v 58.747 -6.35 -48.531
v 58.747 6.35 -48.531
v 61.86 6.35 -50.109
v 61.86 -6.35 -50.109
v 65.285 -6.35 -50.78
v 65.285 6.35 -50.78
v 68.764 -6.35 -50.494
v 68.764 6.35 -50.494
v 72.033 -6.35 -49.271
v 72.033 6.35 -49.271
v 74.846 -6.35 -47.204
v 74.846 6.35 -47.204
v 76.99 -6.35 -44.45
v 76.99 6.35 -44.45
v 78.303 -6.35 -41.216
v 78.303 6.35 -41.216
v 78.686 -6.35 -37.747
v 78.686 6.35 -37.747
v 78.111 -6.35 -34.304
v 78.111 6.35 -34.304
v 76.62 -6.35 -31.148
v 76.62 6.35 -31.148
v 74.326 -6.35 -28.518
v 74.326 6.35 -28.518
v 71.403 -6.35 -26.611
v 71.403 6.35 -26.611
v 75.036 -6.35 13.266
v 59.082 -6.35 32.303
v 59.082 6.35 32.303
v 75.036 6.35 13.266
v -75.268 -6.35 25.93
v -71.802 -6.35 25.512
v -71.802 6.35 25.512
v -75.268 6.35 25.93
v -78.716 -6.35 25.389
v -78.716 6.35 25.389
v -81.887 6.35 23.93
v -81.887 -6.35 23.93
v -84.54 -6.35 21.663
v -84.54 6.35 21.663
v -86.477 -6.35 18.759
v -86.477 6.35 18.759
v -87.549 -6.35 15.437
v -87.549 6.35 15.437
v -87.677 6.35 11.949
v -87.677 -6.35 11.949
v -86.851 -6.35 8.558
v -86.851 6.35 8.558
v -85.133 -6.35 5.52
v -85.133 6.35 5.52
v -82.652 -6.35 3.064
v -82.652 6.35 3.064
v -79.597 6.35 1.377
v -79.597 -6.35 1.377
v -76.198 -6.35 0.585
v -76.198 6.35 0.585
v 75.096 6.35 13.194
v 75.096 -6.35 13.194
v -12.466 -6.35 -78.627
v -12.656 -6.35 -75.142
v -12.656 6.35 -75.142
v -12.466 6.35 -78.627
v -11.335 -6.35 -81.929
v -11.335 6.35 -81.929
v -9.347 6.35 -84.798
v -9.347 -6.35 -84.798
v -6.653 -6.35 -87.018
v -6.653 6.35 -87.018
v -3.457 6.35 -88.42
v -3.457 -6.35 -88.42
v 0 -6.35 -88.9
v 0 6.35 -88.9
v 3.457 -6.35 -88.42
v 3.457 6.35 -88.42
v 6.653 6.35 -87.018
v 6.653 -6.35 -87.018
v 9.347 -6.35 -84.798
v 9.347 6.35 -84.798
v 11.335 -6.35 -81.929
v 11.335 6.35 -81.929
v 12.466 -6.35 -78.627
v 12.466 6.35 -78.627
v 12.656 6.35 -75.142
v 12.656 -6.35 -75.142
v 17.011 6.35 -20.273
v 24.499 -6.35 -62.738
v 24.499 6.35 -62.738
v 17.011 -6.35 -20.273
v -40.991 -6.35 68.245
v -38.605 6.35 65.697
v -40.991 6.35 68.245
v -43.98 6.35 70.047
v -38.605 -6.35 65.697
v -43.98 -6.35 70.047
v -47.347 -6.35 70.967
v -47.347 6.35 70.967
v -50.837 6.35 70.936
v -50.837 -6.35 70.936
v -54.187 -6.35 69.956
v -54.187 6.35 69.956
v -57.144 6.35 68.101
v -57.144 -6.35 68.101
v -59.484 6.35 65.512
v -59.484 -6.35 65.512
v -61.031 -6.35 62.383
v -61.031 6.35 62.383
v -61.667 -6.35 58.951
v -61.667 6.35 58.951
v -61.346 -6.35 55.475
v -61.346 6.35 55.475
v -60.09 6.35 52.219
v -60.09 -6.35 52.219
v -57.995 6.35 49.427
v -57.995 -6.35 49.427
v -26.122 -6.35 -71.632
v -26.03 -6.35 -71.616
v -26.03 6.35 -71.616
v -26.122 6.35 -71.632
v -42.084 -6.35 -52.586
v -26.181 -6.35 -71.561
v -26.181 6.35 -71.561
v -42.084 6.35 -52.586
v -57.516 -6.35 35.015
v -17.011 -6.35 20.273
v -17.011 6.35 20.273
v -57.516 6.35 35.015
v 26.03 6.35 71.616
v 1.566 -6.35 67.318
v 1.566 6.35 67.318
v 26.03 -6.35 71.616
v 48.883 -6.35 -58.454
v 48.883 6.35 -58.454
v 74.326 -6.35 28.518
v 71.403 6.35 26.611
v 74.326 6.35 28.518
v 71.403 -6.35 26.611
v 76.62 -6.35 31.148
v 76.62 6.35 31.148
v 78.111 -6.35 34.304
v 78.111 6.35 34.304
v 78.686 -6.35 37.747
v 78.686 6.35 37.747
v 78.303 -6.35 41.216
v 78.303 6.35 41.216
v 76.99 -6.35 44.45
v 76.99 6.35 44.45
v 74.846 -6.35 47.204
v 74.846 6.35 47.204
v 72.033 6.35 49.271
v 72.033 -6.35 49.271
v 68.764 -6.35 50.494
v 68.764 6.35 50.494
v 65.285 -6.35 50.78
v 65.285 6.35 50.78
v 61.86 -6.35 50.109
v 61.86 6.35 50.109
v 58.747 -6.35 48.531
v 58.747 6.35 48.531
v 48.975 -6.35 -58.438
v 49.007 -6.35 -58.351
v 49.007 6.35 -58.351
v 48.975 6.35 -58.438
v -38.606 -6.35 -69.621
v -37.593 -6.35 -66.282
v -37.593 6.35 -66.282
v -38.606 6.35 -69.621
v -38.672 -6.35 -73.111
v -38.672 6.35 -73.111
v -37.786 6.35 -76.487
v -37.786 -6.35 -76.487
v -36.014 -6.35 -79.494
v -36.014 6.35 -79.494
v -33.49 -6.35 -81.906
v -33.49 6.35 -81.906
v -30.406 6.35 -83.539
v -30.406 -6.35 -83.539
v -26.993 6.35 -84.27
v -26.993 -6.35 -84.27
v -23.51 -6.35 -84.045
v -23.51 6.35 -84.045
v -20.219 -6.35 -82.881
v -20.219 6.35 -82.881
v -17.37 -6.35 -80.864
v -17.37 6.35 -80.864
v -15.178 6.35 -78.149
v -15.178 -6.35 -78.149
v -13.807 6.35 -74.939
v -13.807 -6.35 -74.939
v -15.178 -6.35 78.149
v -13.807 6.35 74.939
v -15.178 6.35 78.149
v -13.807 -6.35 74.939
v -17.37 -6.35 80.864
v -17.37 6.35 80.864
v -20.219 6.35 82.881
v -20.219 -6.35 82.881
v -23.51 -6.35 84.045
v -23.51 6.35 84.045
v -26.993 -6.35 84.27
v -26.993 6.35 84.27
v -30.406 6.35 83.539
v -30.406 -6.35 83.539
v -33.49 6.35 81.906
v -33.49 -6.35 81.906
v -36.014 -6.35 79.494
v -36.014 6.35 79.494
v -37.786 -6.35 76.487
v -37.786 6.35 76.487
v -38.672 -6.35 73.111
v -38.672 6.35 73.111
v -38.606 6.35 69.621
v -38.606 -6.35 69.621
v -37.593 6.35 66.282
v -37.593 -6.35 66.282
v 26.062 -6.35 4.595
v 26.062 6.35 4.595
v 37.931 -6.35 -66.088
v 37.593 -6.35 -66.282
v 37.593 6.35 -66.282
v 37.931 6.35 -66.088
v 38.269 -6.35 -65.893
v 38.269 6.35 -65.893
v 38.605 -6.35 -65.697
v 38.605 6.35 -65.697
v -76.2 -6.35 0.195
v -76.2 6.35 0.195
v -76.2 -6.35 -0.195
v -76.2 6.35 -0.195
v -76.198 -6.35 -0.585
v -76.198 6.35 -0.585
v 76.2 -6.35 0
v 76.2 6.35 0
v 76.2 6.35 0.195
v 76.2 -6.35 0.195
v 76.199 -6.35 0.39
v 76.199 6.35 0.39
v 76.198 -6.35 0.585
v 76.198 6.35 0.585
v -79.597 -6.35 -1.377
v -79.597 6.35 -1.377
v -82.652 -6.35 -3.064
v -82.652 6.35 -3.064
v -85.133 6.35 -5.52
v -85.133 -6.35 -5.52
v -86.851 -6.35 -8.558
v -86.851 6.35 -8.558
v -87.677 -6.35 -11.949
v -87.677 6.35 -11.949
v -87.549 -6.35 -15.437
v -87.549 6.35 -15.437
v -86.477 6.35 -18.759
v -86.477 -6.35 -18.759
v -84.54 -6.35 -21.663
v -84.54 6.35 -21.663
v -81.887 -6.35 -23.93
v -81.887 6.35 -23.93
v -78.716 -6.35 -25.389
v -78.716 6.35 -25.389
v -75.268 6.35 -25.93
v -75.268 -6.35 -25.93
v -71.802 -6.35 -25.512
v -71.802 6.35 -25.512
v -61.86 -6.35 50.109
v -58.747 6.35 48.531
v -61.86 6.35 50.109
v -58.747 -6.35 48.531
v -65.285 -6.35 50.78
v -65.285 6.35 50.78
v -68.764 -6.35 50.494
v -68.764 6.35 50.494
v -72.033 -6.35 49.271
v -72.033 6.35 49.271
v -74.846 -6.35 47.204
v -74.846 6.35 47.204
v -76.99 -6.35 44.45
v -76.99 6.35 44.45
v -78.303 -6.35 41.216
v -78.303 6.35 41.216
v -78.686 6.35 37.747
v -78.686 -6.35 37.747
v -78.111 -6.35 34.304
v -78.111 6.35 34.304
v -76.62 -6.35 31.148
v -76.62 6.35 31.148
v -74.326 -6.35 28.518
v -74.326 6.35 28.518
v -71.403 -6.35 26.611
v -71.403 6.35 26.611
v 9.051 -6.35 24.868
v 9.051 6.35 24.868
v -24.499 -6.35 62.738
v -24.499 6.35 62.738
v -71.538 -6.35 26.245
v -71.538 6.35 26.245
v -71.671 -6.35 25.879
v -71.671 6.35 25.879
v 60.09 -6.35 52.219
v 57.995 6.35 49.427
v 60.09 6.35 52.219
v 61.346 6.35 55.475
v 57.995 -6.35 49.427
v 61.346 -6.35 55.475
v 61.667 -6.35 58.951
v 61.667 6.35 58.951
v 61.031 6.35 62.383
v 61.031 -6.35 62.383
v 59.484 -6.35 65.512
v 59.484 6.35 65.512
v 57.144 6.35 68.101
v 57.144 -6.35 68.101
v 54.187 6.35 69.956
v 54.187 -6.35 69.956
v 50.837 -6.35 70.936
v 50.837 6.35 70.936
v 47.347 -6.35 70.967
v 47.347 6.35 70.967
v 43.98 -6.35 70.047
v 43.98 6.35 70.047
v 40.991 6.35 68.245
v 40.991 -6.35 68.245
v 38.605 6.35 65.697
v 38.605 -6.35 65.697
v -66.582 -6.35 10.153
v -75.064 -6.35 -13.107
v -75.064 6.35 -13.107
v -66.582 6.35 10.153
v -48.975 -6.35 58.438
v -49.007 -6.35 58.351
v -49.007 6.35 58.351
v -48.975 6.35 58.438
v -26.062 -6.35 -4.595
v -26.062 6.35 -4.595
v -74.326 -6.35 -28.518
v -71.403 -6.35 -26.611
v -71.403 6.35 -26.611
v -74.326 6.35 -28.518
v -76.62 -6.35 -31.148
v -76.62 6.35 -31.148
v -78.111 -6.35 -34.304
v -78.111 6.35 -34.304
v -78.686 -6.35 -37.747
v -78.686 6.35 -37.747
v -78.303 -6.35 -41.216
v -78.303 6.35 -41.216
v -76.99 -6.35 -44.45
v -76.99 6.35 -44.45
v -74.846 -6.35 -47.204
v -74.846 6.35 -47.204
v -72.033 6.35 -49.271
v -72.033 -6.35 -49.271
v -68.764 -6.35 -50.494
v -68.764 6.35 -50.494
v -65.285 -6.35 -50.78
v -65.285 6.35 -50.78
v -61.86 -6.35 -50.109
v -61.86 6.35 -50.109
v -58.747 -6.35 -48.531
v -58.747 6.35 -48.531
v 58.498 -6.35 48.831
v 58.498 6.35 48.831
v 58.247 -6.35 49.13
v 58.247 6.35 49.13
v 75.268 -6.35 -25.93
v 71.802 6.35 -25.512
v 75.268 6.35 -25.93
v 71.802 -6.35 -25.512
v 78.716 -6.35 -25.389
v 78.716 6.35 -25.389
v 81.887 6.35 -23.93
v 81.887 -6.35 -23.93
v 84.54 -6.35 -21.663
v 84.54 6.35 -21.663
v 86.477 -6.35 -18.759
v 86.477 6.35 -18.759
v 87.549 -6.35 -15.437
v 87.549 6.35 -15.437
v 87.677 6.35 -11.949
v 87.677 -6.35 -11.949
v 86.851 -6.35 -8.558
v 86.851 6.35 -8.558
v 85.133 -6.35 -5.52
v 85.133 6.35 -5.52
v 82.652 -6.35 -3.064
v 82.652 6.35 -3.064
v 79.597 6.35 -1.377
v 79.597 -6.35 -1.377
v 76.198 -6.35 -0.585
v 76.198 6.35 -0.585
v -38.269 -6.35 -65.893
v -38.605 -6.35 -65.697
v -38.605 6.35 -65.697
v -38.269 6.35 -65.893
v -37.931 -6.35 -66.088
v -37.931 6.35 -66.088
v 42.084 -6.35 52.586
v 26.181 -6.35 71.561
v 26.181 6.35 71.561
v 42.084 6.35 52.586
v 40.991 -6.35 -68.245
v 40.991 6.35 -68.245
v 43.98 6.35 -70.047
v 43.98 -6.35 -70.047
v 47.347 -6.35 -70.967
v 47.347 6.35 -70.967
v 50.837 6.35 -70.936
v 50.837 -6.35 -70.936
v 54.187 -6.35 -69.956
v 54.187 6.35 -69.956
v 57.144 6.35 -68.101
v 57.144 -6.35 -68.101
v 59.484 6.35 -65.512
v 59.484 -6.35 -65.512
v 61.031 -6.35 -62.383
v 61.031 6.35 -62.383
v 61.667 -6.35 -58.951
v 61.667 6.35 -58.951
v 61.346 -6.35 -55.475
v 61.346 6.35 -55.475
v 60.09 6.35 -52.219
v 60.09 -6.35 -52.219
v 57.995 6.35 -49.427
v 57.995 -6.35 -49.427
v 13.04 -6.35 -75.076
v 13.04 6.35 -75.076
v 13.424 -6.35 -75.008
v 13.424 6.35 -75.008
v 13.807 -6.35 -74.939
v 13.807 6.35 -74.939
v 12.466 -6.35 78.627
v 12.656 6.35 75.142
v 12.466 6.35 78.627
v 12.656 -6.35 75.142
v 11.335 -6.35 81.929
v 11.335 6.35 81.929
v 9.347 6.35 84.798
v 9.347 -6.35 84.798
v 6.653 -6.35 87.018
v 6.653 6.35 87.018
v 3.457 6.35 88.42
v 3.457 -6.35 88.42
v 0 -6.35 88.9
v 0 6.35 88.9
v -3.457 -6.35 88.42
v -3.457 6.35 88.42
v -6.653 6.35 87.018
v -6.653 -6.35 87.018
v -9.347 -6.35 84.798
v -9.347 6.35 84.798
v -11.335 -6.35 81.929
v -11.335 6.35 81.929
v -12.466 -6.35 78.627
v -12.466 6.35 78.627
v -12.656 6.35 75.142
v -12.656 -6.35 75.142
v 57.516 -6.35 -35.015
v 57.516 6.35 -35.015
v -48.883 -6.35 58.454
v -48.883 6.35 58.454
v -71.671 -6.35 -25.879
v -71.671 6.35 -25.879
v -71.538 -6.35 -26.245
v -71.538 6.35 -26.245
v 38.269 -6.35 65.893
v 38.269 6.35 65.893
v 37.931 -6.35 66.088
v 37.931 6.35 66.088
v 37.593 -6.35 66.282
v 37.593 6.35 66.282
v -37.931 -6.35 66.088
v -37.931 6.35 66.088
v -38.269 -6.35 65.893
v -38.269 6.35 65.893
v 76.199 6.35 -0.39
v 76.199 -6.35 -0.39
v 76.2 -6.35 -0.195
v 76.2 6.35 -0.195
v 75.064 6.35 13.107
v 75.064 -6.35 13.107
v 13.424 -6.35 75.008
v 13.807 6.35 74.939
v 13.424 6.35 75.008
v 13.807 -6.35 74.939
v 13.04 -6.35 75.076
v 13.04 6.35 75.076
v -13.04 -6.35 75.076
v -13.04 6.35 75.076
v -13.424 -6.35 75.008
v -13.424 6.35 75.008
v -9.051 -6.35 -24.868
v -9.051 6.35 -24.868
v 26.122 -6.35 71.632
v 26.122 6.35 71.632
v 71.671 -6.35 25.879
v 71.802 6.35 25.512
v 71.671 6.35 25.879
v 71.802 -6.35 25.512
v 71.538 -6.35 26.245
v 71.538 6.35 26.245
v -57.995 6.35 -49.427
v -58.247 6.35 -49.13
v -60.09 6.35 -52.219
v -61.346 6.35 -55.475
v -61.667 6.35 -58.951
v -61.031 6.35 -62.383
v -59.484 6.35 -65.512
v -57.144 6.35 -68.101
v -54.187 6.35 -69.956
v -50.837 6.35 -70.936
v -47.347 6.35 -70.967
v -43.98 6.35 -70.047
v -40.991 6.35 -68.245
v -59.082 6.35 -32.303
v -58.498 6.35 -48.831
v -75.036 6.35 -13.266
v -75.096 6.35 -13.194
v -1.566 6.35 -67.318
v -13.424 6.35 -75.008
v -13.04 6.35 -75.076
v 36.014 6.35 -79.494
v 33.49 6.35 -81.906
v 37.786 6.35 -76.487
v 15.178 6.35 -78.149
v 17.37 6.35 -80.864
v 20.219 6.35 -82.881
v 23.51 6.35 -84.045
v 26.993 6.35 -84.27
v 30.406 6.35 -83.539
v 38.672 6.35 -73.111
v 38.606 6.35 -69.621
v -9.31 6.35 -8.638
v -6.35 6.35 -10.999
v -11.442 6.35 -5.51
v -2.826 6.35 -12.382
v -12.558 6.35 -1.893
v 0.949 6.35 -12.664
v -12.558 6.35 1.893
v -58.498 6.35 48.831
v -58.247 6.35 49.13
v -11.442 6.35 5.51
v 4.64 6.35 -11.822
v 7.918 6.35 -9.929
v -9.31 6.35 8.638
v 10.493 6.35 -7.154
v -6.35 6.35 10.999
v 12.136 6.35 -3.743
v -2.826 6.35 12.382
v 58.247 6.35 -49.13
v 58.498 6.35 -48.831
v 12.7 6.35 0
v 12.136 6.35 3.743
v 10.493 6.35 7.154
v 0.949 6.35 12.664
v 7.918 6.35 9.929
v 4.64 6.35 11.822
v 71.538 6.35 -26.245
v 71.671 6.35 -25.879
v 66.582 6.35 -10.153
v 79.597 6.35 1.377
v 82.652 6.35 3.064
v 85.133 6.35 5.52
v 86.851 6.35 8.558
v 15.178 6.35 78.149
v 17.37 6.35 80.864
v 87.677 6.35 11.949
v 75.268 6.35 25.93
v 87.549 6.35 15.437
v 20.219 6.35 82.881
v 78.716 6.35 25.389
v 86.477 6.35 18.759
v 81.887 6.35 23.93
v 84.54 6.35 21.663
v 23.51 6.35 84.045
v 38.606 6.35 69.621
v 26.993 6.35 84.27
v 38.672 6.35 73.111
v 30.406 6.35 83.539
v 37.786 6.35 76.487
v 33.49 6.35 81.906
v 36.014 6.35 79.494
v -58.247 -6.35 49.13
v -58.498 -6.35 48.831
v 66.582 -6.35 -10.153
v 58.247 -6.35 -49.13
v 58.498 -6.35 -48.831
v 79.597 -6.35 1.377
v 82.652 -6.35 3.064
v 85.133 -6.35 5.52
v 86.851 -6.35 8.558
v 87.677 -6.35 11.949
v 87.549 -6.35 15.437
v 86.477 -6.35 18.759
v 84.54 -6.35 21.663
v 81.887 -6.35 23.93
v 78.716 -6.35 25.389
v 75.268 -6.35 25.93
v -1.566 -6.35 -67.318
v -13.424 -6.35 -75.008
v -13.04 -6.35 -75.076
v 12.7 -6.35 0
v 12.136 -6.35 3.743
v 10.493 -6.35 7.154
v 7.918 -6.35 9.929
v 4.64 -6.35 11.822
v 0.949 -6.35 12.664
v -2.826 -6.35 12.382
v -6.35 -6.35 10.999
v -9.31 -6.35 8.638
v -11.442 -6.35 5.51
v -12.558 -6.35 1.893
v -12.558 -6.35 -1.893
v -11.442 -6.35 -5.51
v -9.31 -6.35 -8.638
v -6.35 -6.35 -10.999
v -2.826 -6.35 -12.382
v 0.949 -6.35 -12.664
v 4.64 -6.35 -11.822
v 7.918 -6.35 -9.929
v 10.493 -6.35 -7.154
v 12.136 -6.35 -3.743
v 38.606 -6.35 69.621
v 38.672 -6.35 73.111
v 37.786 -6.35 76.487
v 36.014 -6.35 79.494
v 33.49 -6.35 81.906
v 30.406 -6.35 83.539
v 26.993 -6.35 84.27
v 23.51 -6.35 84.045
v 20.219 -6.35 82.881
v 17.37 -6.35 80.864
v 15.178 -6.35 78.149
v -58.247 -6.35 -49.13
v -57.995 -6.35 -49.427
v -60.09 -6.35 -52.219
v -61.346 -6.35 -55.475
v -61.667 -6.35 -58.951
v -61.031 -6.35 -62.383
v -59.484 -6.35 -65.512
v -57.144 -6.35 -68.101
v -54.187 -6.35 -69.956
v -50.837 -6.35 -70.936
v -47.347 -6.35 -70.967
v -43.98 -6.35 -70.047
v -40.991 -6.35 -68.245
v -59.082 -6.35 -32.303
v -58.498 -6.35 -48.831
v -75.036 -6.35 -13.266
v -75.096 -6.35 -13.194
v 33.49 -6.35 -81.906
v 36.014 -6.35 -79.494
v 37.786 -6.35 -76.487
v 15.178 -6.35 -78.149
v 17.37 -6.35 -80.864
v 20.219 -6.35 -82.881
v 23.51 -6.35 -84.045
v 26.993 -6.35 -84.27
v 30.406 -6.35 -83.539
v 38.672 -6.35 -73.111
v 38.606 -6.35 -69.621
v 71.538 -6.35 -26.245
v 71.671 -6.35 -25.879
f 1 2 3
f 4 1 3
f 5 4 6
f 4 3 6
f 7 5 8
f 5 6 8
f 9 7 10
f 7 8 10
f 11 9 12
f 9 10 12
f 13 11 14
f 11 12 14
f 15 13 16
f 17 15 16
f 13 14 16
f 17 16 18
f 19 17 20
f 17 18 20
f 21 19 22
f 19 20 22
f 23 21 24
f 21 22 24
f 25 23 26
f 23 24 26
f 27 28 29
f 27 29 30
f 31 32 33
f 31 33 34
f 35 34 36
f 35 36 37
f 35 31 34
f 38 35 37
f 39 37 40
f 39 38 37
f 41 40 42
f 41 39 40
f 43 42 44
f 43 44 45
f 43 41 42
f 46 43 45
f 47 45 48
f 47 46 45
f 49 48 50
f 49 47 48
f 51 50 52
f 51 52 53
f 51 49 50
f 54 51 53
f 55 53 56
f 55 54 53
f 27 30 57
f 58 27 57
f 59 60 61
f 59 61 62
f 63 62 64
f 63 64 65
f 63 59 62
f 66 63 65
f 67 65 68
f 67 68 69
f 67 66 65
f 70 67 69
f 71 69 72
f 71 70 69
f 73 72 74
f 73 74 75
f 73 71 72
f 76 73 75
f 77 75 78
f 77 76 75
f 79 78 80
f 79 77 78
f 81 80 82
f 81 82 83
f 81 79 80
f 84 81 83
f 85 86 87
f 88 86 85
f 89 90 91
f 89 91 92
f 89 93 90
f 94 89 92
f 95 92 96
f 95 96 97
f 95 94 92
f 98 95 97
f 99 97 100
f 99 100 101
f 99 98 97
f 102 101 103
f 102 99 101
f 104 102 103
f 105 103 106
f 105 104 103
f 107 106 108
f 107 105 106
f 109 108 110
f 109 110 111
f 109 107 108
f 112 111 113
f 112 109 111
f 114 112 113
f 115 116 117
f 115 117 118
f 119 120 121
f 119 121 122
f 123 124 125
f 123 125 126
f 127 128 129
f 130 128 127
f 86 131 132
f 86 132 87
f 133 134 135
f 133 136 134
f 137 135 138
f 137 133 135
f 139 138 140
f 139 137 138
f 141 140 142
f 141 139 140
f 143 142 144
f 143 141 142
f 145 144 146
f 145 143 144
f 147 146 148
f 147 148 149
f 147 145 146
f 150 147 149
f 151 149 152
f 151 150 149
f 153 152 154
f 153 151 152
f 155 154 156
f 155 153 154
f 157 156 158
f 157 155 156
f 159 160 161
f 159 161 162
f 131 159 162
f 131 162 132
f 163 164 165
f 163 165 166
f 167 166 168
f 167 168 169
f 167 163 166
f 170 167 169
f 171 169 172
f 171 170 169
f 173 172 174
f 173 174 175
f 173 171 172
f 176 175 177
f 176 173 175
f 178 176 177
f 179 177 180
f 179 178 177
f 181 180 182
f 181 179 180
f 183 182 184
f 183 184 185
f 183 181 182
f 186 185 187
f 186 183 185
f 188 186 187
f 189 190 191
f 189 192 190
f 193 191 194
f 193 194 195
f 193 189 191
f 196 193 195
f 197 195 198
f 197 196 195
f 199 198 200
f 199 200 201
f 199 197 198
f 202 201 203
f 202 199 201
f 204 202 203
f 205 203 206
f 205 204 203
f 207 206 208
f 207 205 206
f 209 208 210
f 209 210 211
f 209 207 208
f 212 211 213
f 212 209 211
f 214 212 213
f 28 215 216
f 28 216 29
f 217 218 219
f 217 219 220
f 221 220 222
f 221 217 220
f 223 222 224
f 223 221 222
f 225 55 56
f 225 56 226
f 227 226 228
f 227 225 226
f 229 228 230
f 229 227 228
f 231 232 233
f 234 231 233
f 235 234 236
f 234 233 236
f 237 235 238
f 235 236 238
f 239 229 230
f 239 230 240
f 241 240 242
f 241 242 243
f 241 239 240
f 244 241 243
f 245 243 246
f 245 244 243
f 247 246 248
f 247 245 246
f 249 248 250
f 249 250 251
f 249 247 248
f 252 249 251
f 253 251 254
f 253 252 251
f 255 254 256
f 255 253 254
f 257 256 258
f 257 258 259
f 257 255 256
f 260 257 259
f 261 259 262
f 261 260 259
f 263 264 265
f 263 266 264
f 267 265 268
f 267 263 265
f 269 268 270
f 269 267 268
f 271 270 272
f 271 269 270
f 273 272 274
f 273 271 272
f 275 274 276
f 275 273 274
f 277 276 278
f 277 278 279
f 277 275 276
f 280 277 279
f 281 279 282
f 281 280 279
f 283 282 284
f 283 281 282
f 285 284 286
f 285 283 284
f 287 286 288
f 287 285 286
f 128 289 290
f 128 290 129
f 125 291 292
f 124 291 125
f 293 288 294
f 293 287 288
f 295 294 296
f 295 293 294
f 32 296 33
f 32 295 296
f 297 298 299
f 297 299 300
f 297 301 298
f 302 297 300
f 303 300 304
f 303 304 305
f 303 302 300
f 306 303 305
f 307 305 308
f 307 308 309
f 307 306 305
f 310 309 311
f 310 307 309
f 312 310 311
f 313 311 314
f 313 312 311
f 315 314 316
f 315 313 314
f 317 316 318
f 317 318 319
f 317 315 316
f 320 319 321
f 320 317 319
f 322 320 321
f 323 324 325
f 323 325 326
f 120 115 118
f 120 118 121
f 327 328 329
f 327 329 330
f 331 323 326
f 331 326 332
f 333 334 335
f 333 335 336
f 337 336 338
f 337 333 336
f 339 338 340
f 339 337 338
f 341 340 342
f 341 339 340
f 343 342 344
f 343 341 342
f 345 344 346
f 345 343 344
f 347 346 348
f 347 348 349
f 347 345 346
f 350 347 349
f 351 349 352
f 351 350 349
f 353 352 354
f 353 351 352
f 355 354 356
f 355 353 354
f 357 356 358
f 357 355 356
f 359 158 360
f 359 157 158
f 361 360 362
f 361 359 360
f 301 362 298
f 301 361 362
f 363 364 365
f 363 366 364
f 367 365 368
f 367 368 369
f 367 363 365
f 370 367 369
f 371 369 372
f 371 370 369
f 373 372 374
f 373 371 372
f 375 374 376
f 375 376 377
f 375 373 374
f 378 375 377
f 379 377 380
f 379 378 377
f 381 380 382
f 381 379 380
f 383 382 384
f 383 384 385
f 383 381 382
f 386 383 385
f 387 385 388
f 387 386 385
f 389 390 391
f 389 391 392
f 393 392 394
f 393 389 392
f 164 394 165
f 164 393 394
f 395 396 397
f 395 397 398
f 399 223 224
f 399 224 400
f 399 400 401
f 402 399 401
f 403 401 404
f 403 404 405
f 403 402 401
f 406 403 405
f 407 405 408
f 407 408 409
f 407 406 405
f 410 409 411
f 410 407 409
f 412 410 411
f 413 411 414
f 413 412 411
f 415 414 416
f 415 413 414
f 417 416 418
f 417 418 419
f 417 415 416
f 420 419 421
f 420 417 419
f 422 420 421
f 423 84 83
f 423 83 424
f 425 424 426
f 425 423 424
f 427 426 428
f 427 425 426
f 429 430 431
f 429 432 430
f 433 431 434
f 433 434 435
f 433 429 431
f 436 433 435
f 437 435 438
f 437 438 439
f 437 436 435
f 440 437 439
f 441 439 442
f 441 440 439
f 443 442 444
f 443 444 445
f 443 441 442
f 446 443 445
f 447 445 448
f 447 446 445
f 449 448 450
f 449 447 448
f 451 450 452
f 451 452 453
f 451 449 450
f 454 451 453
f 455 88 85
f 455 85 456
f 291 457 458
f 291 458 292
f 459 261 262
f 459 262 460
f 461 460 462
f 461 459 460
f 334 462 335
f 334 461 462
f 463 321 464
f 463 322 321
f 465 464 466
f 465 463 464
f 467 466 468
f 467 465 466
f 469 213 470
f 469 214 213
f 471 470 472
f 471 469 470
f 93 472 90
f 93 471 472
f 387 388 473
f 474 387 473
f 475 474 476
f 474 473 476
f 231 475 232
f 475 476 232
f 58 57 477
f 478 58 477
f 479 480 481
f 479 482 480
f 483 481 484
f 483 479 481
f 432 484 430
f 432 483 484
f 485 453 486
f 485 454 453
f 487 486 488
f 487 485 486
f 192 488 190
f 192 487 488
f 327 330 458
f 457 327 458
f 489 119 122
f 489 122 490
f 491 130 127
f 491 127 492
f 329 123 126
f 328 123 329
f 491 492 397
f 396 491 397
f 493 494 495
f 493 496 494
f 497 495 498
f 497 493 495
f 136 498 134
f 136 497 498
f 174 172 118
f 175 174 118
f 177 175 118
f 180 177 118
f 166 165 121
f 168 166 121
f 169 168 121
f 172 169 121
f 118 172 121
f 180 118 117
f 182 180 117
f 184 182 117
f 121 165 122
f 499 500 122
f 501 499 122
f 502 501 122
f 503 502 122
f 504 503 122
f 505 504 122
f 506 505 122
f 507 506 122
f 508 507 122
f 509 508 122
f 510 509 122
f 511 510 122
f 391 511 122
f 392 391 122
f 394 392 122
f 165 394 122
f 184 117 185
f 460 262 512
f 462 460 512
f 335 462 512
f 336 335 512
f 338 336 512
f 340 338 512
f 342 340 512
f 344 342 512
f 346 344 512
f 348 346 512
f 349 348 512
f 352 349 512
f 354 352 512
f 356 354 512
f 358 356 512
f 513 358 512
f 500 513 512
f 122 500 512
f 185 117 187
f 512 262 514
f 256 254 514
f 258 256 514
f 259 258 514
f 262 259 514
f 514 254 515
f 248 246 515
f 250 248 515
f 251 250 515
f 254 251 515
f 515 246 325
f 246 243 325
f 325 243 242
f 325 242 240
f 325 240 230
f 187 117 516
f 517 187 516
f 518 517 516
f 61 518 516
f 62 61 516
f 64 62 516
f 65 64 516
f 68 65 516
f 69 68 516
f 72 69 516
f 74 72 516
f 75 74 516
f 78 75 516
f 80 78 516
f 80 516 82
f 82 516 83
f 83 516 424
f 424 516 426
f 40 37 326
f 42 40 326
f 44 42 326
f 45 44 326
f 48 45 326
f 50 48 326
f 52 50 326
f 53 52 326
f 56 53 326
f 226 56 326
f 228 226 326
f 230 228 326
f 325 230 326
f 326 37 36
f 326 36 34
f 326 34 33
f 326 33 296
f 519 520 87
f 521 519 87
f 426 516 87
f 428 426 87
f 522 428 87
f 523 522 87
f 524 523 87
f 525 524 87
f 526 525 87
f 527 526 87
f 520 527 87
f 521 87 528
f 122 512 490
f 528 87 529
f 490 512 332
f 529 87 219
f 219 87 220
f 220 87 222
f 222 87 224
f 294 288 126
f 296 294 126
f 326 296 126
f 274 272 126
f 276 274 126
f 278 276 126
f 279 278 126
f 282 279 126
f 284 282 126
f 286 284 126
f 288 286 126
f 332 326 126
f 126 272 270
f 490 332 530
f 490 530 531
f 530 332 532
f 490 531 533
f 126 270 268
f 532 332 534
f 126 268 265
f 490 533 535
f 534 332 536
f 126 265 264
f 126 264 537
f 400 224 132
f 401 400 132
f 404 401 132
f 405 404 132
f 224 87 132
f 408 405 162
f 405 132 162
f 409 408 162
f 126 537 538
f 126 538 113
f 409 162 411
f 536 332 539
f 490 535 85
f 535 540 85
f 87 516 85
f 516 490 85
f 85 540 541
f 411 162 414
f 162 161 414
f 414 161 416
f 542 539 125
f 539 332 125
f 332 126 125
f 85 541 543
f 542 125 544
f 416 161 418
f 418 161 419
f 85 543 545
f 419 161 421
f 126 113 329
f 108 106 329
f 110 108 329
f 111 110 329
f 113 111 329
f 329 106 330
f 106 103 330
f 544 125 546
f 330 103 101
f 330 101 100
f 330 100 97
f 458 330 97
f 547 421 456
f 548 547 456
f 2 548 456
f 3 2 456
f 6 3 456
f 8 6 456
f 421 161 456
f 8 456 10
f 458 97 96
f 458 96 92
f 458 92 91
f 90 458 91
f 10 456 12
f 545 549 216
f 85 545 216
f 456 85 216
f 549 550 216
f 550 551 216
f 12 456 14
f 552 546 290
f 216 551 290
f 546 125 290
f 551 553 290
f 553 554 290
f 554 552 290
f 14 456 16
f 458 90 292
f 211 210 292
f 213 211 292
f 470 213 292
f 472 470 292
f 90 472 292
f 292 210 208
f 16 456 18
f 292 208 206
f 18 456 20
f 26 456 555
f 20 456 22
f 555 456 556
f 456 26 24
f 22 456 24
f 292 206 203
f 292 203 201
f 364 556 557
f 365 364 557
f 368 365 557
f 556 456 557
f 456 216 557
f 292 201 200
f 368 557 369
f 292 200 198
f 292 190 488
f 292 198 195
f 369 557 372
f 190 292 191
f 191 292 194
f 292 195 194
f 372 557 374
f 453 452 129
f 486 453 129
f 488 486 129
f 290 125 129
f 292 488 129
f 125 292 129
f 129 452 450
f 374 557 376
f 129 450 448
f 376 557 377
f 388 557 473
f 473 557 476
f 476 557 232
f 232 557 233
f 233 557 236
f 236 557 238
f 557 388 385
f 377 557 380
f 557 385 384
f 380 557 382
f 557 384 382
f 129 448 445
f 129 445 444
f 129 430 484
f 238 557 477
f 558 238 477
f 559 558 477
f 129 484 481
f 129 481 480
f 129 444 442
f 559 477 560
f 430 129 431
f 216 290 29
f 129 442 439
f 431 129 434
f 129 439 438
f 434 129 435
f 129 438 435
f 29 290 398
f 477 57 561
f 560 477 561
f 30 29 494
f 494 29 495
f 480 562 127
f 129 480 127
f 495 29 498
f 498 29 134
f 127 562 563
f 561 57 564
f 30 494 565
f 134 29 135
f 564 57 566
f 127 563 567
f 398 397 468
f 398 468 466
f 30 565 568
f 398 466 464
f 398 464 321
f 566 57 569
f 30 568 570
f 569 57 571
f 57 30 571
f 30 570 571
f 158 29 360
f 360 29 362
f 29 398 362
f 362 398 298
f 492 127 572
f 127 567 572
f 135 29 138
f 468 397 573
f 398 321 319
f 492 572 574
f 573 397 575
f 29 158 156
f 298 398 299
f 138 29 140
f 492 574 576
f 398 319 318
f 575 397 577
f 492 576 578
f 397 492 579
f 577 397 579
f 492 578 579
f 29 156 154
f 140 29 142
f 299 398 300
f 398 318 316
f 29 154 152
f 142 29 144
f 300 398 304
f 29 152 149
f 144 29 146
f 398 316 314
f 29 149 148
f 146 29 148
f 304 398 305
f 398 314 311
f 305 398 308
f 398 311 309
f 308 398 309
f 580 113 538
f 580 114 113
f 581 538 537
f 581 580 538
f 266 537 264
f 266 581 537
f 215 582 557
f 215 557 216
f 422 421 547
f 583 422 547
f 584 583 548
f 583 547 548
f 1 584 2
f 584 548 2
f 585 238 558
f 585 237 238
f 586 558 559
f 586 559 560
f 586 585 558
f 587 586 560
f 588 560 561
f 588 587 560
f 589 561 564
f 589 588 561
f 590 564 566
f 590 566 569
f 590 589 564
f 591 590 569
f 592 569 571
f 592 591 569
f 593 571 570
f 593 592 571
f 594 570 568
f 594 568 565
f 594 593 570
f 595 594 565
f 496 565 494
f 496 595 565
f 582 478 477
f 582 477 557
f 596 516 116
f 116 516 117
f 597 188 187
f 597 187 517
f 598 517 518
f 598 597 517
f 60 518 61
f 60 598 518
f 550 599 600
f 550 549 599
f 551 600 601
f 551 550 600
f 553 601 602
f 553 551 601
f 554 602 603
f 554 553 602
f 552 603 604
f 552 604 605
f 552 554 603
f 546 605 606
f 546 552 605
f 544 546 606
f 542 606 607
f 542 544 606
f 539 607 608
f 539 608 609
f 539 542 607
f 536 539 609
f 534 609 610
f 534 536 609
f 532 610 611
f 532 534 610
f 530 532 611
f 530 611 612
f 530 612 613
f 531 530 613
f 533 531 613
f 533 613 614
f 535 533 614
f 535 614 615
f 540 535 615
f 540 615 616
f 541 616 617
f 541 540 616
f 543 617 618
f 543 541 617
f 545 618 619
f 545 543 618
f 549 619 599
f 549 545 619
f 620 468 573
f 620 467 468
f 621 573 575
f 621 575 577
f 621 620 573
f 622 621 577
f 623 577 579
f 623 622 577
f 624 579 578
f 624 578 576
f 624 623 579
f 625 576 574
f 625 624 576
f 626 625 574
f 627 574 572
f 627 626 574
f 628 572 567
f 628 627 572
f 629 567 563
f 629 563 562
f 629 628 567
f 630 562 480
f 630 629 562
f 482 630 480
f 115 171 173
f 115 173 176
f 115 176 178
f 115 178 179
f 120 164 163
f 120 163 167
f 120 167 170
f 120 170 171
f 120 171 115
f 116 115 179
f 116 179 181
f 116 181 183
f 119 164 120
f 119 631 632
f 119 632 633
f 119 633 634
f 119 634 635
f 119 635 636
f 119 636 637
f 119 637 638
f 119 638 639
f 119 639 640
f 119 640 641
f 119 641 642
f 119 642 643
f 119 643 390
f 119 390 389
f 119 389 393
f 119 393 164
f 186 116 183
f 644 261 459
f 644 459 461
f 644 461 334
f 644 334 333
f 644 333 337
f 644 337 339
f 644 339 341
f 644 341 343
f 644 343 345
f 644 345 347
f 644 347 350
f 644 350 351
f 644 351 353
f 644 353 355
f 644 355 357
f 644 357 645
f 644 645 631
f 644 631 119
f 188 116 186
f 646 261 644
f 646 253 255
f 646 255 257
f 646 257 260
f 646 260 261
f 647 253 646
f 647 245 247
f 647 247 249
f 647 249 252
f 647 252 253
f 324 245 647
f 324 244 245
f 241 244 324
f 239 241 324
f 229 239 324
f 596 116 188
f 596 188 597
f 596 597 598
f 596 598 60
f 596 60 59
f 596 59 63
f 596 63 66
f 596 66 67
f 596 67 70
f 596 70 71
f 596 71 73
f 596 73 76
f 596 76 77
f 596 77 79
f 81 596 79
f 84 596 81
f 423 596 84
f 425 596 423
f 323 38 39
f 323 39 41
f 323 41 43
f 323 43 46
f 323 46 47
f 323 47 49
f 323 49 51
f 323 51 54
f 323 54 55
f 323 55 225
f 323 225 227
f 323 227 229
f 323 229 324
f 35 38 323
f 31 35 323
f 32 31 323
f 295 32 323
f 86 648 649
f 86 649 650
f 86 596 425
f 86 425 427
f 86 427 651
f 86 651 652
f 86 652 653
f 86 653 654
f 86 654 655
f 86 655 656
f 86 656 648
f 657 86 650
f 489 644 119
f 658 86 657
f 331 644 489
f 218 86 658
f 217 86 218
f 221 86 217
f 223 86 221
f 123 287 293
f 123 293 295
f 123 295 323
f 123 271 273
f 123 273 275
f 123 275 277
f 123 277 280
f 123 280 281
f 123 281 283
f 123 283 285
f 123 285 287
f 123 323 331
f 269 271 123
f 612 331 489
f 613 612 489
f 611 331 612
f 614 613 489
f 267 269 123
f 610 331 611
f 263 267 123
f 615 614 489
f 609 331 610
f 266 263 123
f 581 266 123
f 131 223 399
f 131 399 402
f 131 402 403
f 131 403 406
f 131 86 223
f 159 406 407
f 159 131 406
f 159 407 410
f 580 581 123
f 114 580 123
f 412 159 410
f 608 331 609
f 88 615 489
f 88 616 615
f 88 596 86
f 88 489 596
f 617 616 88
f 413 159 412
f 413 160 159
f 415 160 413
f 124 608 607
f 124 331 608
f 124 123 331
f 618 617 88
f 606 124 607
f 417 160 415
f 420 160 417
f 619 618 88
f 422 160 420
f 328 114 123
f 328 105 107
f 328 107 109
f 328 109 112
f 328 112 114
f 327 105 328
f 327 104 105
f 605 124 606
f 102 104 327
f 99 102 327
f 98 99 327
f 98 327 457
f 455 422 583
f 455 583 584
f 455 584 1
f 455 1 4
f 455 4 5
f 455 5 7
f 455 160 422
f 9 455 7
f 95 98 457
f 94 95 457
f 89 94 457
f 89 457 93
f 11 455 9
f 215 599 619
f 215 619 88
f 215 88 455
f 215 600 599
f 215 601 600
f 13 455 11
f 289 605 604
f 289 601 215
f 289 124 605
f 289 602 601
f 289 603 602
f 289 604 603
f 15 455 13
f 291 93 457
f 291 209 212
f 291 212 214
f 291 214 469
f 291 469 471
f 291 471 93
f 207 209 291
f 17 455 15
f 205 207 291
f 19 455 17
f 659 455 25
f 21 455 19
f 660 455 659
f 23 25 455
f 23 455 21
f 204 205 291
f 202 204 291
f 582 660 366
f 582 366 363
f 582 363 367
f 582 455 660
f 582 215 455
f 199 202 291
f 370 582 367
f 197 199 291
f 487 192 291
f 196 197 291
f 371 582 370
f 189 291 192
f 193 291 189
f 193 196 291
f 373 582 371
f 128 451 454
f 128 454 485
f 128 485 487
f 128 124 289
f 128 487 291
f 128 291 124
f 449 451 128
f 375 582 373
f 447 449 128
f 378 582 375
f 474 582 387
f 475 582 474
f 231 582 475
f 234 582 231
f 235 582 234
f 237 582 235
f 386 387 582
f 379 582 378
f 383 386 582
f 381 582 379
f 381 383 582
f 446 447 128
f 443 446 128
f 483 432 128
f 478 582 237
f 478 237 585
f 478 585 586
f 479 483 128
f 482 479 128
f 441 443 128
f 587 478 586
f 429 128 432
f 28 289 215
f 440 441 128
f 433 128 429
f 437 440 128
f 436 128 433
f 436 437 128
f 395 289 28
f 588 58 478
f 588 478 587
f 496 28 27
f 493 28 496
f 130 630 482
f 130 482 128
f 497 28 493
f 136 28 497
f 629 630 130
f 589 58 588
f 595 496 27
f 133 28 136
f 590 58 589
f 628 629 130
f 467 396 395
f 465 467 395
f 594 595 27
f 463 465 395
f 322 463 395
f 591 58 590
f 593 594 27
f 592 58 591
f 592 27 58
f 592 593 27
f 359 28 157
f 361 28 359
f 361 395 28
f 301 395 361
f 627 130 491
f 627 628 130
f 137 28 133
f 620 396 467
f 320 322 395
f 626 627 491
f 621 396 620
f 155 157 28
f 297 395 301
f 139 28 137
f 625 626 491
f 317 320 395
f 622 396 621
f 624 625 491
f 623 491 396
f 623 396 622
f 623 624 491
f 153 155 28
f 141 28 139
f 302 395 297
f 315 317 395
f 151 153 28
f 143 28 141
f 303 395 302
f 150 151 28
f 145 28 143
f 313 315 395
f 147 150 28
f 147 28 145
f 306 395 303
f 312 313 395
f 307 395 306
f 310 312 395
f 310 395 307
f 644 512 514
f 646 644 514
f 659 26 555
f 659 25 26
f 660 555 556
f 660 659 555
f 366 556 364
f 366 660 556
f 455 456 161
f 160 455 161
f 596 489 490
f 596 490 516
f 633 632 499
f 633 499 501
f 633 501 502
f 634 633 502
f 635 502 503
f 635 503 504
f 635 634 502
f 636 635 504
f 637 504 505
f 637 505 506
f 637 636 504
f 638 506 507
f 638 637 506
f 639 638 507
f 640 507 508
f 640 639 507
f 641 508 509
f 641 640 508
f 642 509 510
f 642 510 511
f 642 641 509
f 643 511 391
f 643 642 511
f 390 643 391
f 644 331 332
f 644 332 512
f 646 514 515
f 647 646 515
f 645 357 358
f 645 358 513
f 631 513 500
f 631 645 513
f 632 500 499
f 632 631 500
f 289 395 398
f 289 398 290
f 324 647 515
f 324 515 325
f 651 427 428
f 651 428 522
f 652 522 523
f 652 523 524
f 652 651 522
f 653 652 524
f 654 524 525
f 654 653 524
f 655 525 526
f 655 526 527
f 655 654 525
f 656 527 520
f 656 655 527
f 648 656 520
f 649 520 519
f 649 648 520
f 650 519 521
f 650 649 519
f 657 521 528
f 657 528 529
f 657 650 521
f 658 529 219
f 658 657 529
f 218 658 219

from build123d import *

# Parameters (mm, degrees)
F0_R     = 12.7
F1_DEPTH = 6.35


with BuildPart() as f1:
    # F0 (on Front) → F1 (new body, symmetric)
    with BuildSketch(Plane.XZ):
        with BuildLine():
            ThreePointArc((76.1977570212, -0.5846579641), (76.1994392532, -0.2923311333), (76.2, 0))
            ThreePointArc((76.2, 0), (76.1994392532, 0.2923311333), (76.1977570212, 0.5846579641))
            ThreePointArc((76.1977570212, 0.5846579641), (75.8897554045, 6.8691356552), (75.0643215302, 13.1067781397))
            Line((75.0643215302, 13.1067781397), (66.5824360485, -10.1528339917))
            Line((66.5824360485, -10.1528339917), (75.0423507795, -13.2319911382))
            ThreePointArc((75.0423507795, -13.2319911382), (75.8839990446, -6.9324374501), (76.1977570212, -0.5846579641))
        make_face()
        with BuildLine():
            ThreePointArc((75.0643215302, 13.1067781397), (75.8897554045, 6.8691356552), (76.1977570212, 0.5846579641))
            ThreePointArc((76.1977570212, 0.5846579641), (87.5494092428, 15.4373229946), (71.802434794, 25.5117690029))
            ThreePointArc((71.802434794, 25.5117690029), (73.6743133021, 19.4559903234), (75.0364186026, 13.2655901978))
            Line((75.0364186026, 13.2655901978), (75.0962151587, 13.1942390501))
            Line((75.0962151587, 13.1942390501), (75.0643215302, 13.1067781397))
        make_face()
        with BuildLine():
            ThreePointArc((71.802434794, -25.5117690029), (87.5494092428, -15.4373229946), (76.1977570212, -0.5846579641))
            ThreePointArc((76.1977570212, -0.5846579641), (75.8839990446, -6.9324374501), (75.0423507795, -13.2319911382))
            ThreePointArc((75.0423507795, -13.2319911382), (73.6786671882, -19.4394959134), (71.802434794, -25.5117690029))
        make_face()
        with BuildLine():
            ThreePointArc((75.0364186026, 13.2655901978), (73.6743133021, 19.4559903234), (71.802434794, 25.5117690029))
            ThreePointArc((71.802434794, 25.5117690029), (71.6045777039, 26.0619349214), (71.4025051926, 26.6105665521))
            ThreePointArc((71.4025051926, 26.6105665521), (68.9366006876, 32.4682165453), (65.9911357684, 38.1))
            Line((65.9911357684, 38.1), (59.08217806, 32.3026961351))
            Line((59.08217806, 32.3026961351), (75.0364186026, 13.2655901978))
        make_face()
        with BuildLine():
            ThreePointArc((71.802434794, -25.5117690029), (73.6786671882, -19.4394959134), (75.0423507795, -13.2319911382))
            Line((75.0423507795, -13.2319911382), (66.5824360485, -10.1528339917))
            Line((66.5824360485, -10.1528339917), (57.5160444937, -35.0153190433))
            Line((57.5160444937, -35.0153190433), (65.9911357684, -38.1))
            ThreePointArc((65.9911357684, -38.1), (68.9366006876, -32.4682165453), (71.4025051926, -26.6105665521))
            ThreePointArc((71.4025051926, -26.6105665521), (71.6045777039, -26.0619349214), (71.802434794, -25.5117690029))
        make_face()
        Polygon((57.5160444937, -35.0153190433), (66.5824360485, -10.1528339917), (26.0619349214, 4.5954222961), (59.08217806, 32.3026961351), (42.0838301815, 52.585664068), (9.0512150112, 24.8680088618), (1.5661335663, 67.3180151784), (-24.498605867, 62.7384980597), (-17.0107199103, 20.2725865657), (-57.5160444937, 35.0153190433), (-66.5824360485, 10.1528339917), (-26.0619349214, -4.5954222961), (-59.08217806, -32.3026961351), (-42.0838301815, -52.585664068), (-9.0512150112, -24.8680088618), (-1.5661335663, -67.3180151784), (24.498605867, -62.7384980597), (17.0107199103, -20.2725865657), align=None)
        Polygon((9.1694975967, 24.5029696394), (25.8049429742, 4.310466961), (16.6354453775, -20.1925026784), (-9.1694975967, -24.5029696394), (-25.8049429742, -4.310466961), (-16.6354453775, 20.1925026784), align=None, mode=Mode.SUBTRACT)
        with BuildLine():
            ThreePointArc((65.9911357684, 38.1), (68.9366006876, 32.4682165453), (71.4025051926, 26.6105665521))
            ThreePointArc((71.4025051926, 26.6105665521), (76.9896583964, 44.45), (58.7466792395, 48.5311001146))
            ThreePointArc((58.7466792395, 48.5311001146), (62.5866006876, 43.4667391734), (65.9911357684, 38.1))
        make_face()
        with BuildLine():
            ThreePointArc((58.7466792395, -48.5311001146), (76.9896583964, -44.45), (71.4025051926, -26.6105665521))
            ThreePointArc((71.4025051926, -26.6105665521), (68.9366006876, -32.4682165453), (65.9911357684, -38.1))
            ThreePointArc((65.9911357684, -38.1), (62.5866006876, -43.4667391734), (58.7466792395, -48.5311001146))
        make_face()
        with BuildLine():
            Line((42.0838301815, 52.585664068), (59.08217806, 32.3026961351))
            Line((59.08217806, 32.3026961351), (65.9911357684, 38.1))
            ThreePointArc((65.9911357684, 38.1), (62.5866006876, 43.4667391734), (58.7466792395, 48.5311001146))
            ThreePointArc((58.7466792395, 48.5311001146), (58.3725865657, 48.9804158581), (57.995057449, 49.4268480837))
            ThreePointArc((57.995057449, 49.4268480837), (53.6744308919, 54.0878495453), (48.9804158581, 58.3725865657))
            Line((48.9804158581, 58.3725865657), (42.0838301815, 52.585664068))
        make_face()
        with BuildLine():
            Line((65.9911357684, -38.1), (57.5160444937, -35.0153190433))
            Line((57.5160444937, -35.0153190433), (49.0065474088, -58.35064962))
            ThreePointArc((49.0065474088, -58.35064962), (53.6865385269, -54.0758317643), (57.995057449, -49.4268480837))
            ThreePointArc((57.995057449, -49.4268480837), (58.3725865657, -48.9804158581), (58.7466792395, -48.5311001146))
            ThreePointArc((58.7466792395, -48.5311001146), (62.5866006876, -43.4667391734), (65.9911357684, -38.1))
        make_face()
        with BuildLine():
            Line((26.1813579343, 71.5609984329), (42.0838301815, 52.585664068))
            Line((42.0838301815, 52.585664068), (48.9804158581, 58.3725865657))
            ThreePointArc((48.9804158581, 58.3725865657), (43.9456664643, 62.2512521883), (38.6052071601, 65.6968643097))
            ThreePointArc((38.6052071601, 65.6968643097), (38.1, 65.9911357684), (37.5925498612, 66.2815222738))
            ThreePointArc((37.5925498612, 66.2815222738), (31.9960317228, 69.1570238949), (26.1813579343, 71.5609984329))
        make_face()
        with BuildLine():
            ThreePointArc((57.995057449, -49.4268480837), (53.6865385269, -54.0758317643), (49.0065474088, -58.35064962))
            Line((49.0065474088, -58.35064962), (48.9746537804, -58.4381105304))
            Line((48.9746537804, -58.4381105304), (48.8829635959, -58.4542202932))
            ThreePointArc((48.8829635959, -58.4542202932), (43.8937236817, -62.2878882397), (38.6052071601, -65.6968643097))
            ThreePointArc((38.6052071601, -65.6968643097), (57.1438185011, -68.1013509933), (57.995057449, -49.4268480837))
        make_face()
        with BuildLine():
            ThreePointArc((48.9804158581, 58.3725865657), (53.6744308919, 54.0878495453), (57.995057449, 49.4268480837))
            ThreePointArc((57.995057449, 49.4268480837), (57.1438185011, 68.1013509933), (38.6052071601, 65.6968643097))
            ThreePointArc((38.6052071601, 65.6968643097), (43.9456664643, 62.2512521883), (48.9804158581, 58.3725865657))
        make_face()
        with BuildLine():
            Line((26.1215613783, 71.6323495805), (26.1813579343, 71.5609984329))
            ThreePointArc((26.1813579343, 71.5609984329), (31.9960317228, 69.1570238949), (37.5925498612, 66.2815222738))
            ThreePointArc((37.5925498612, 66.2815222738), (30.4055907417, 83.5386739879), (13.807377345, 74.9386170866))
            ThreePointArc((13.807377345, 74.9386170866), (19.9877747752, 73.5318220877), (26.0298711938, 71.6162398177))
            Line((26.0298711938, 71.6162398177), (26.1215613783, 71.6323495805))
        make_face()
        with BuildLine():
            ThreePointArc((38.6052071601, -65.6968643097), (43.8937236817, -62.2878882397), (48.8829635959, -58.4542202932))
            Line((48.8829635959, -58.4542202932), (24.498605867, -62.7384980597))
            Line((24.498605867, -62.7384980597), (26.0619349214, -71.6045777039))
            ThreePointArc((26.0619349214, -71.6045777039), (31.9383325803, -69.1836896384), (37.5925498612, -66.2815222738))
            ThreePointArc((37.5925498612, -66.2815222738), (38.1, -65.9911357684), (38.6052071601, -65.6968643097))
        make_face()
        with BuildLine():
            Line((26.0619349214, -71.6045777039), (24.498605867, -62.7384980597))
            Line((24.498605867, -62.7384980597), (-1.5661335663, -67.3180151784))
            Line((-1.5661335663, -67.3180151784), (0, -76.2))
            ThreePointArc((0, -76.2), (6.35, -75.9349557187), (12.6558259531, -75.1416666667))
            ThreePointArc((12.6558259531, -75.1416666667), (13.2319911382, -75.0423507795), (13.807377345, -74.9386170866))
            ThreePointArc((13.807377345, -74.9386170866), (20.0042362963, -73.5273454587), (26.0619349214, -71.6045777039))
        make_face()
        with BuildLine():
            Line((1.5661335663, 67.3180151784), (26.0298711938, 71.6162398177))
            ThreePointArc((26.0298711938, 71.6162398177), (19.9877747752, 73.5318220877), (13.807377345, 74.9386170866))
            ThreePointArc((13.807377345, 74.9386170866), (13.2319911382, 75.0423507795), (12.6558259531, 75.1416666667))
            ThreePointArc((12.6558259531, 75.1416666667), (6.35, 75.9349557187), (0, 76.2))
            Line((0, 76.2), (1.5661335663, 67.3180151784))
        make_face()
        with BuildLine():
            Line((-24.498605867, 62.7384980597), (1.5661335663, 67.3180151784))
            Line((1.5661335663, 67.3180151784), (0, 76.2))
            ThreePointArc((0, 76.2), (-6.35, 75.9349557187), (-12.6558259531, 75.1416666667))
            ThreePointArc((-12.6558259531, 75.1416666667), (-13.2319911382, 75.0423507795), (-13.807377345, 74.9386170866))
            ThreePointArc((-13.807377345, 74.9386170866), (-20.0042362963, 73.5273454587), (-26.0619349214, 71.6045777039))
            Line((-26.0619349214, 71.6045777039), (-24.498605867, 62.7384980597))
        make_face()
        with BuildLine():
            Line((0, -76.2), (-1.5661335663, -67.3180151784))
            Line((-1.5661335663, -67.3180151784), (-26.0298711938, -71.6162398177))
            ThreePointArc((-26.0298711938, -71.6162398177), (-19.9877747752, -73.5318220877), (-13.807377345, -74.9386170866))
            ThreePointArc((-13.807377345, -74.9386170866), (-13.2319911382, -75.0423507795), (-12.6558259531, -75.1416666667))
            ThreePointArc((-12.6558259531, -75.1416666667), (-6.35, -75.9349557187), (0, -76.2))
        make_face()
        with BuildLine():
            ThreePointArc((37.5925498612, -66.2815222738), (31.9383325803, -69.1836896384), (26.0619349214, -71.6045777039))
            ThreePointArc((26.0619349214, -71.6045777039), (20.0042362963, -73.5273454587), (13.807377345, -74.9386170866))
            ThreePointArc((13.807377345, -74.9386170866), (30.4055907417, -83.5386739879), (37.5925498612, -66.2815222738))
        make_face()
        with BuildLine():
            Line((-48.8829635959, 58.4542202932), (-24.498605867, 62.7384980597))
            Line((-24.498605867, 62.7384980597), (-26.0619349214, 71.6045777039))
            ThreePointArc((-26.0619349214, 71.6045777039), (-31.9383325803, 69.1836896384), (-37.5925498612, 66.2815222738))
            ThreePointArc((-37.5925498612, 66.2815222738), (-38.1, 65.9911357684), (-38.6052071601, 65.6968643097))
            ThreePointArc((-38.6052071601, 65.6968643097), (-43.8937236817, 62.2878882397), (-48.8829635959, 58.4542202932))
        make_face()
        with BuildLine():
            ThreePointArc((-12.6558259531, 75.1416666667), (-6.35, 75.9349557187), (0, 76.2))
            ThreePointArc((0, 76.2), (6.35, 75.9349557187), (12.6558259531, 75.1416666667))
            ThreePointArc((12.6558259531, 75.1416666667), (0, 88.9), (-12.6558259531, 75.1416666667))
        make_face()
        with BuildLine():
            ThreePointArc((-13.807377345, -74.9386170866), (-19.9877747752, -73.5318220877), (-26.0298711938, -71.6162398177))
            Line((-26.0298711938, -71.6162398177), (-26.1215613783, -71.6323495805))
            Line((-26.1215613783, -71.6323495805), (-26.1813579343, -71.5609984329))
            ThreePointArc((-26.1813579343, -71.5609984329), (-31.9960317228, -69.1570238949), (-37.5925498612, -66.2815222738))
            ThreePointArc((-37.5925498612, -66.2815222738), (-30.4055907417, -83.5386739879), (-13.807377345, -74.9386170866))
        make_face()
        with BuildLine():
            ThreePointArc((12.6558259531, -75.1416666667), (6.35, -75.9349557187), (0, -76.2))
            ThreePointArc((0, -76.2), (-6.35, -75.9349557187), (-12.6558259531, -75.1416666667))
            ThreePointArc((-12.6558259531, -75.1416666667), (0, -88.9), (12.6558259531, -75.1416666667))
        make_face()
        with BuildLine():
            Line((-48.9746537804, 58.4381105304), (-48.8829635959, 58.4542202932))
            ThreePointArc((-48.8829635959, 58.4542202932), (-43.8937236817, 62.2878882397), (-38.6052071601, 65.6968643097))
            ThreePointArc((-38.6052071601, 65.6968643097), (-57.1438185011, 68.1013509933), (-57.995057449, 49.4268480837))
            ThreePointArc((-57.995057449, 49.4268480837), (-53.6865385269, 54.0758317643), (-49.0065474088, 58.35064962))
            Line((-49.0065474088, 58.35064962), (-48.9746537804, 58.4381105304))
        make_face()
        with BuildLine():
            ThreePointArc((-37.5925498612, 66.2815222738), (-31.9383325803, 69.1836896384), (-26.0619349214, 71.6045777039))
            ThreePointArc((-26.0619349214, 71.6045777039), (-20.0042362963, 73.5273454587), (-13.807377345, 74.9386170866))
            ThreePointArc((-13.807377345, 74.9386170866), (-30.4055907417, 83.5386739879), (-37.5925498612, 66.2815222738))
        make_face()
        with BuildLine():
            ThreePointArc((-37.5925498612, -66.2815222738), (-31.9960317228, -69.1570238949), (-26.1813579343, -71.5609984329))
            Line((-26.1813579343, -71.5609984329), (-42.0838301815, -52.585664068))
            Line((-42.0838301815, -52.585664068), (-48.9804158581, -58.3725865657))
            ThreePointArc((-48.9804158581, -58.3725865657), (-43.9456664643, -62.2512521883), (-38.6052071601, -65.6968643097))
            ThreePointArc((-38.6052071601, -65.6968643097), (-38.1, -65.9911357684), (-37.5925498612, -66.2815222738))
        make_face()
        with BuildLine():
            Line((-48.9804158581, -58.3725865657), (-42.0838301815, -52.585664068))
            Line((-42.0838301815, -52.585664068), (-59.08217806, -32.3026961351))
            Line((-59.08217806, -32.3026961351), (-65.9911357684, -38.1))
            ThreePointArc((-65.9911357684, -38.1), (-62.5866006876, -43.4667391734), (-58.7466792395, -48.5311001146))
            ThreePointArc((-58.7466792395, -48.5311001146), (-58.3725865657, -48.9804158581), (-57.995057449, -49.4268480837))
            ThreePointArc((-57.995057449, -49.4268480837), (-53.6744308919, -54.0878495453), (-48.9804158581, -58.3725865657))
        make_face()
        with BuildLine():
            Line((-57.5160444937, 35.0153190433), (-49.0065474088, 58.35064962))
            ThreePointArc((-49.0065474088, 58.35064962), (-53.6865385269, 54.0758317643), (-57.995057449, 49.4268480837))
            ThreePointArc((-57.995057449, 49.4268480837), (-58.3725865657, 48.9804158581), (-58.7466792395, 48.5311001146))
            ThreePointArc((-58.7466792395, 48.5311001146), (-62.5866006876, 43.4667391734), (-65.9911357684, 38.1))
            Line((-65.9911357684, 38.1), (-57.5160444937, 35.0153190433))
        make_face()
        with BuildLine():
            Line((-66.5824360485, 10.1528339917), (-57.5160444937, 35.0153190433))
            Line((-57.5160444937, 35.0153190433), (-65.9911357684, 38.1))
            ThreePointArc((-65.9911357684, 38.1), (-68.9366006876, 32.4682165453), (-71.4025051926, 26.6105665521))
            ThreePointArc((-71.4025051926, 26.6105665521), (-71.6045777039, 26.0619349214), (-71.802434794, 25.5117690029))
            ThreePointArc((-71.802434794, 25.5117690029), (-73.6786671882, 19.4394959134), (-75.0423507795, 13.2319911382))
            Line((-75.0423507795, 13.2319911382), (-66.5824360485, 10.1528339917))
        make_face()
        with BuildLine():
            Line((-65.9911357684, -38.1), (-59.08217806, -32.3026961351))
            Line((-59.08217806, -32.3026961351), (-75.0364186026, -13.2655901978))
            ThreePointArc((-75.0364186026, -13.2655901978), (-73.6743133021, -19.4559903234), (-71.802434794, -25.5117690029))
            ThreePointArc((-71.802434794, -25.5117690029), (-71.6045777039, -26.0619349214), (-71.4025051926, -26.6105665521))
            ThreePointArc((-71.4025051926, -26.6105665521), (-68.9366006876, -32.4682165453), (-65.9911357684, -38.1))
        make_face()
        with BuildLine():
            ThreePointArc((-38.6052071601, -65.6968643097), (-43.9456664643, -62.2512521883), (-48.9804158581, -58.3725865657))
            ThreePointArc((-48.9804158581, -58.3725865657), (-53.6744308919, -54.0878495453), (-57.995057449, -49.4268480837))
            ThreePointArc((-57.995057449, -49.4268480837), (-57.1438185011, -68.1013509933), (-38.6052071601, -65.6968643097))
        make_face()
        with BuildLine():
            Line((-75.0643215302, -13.1067781397), (-66.5824360485, 10.1528339917))
            Line((-66.5824360485, 10.1528339917), (-75.0423507795, 13.2319911382))
            ThreePointArc((-75.0423507795, 13.2319911382), (-75.8839990446, 6.9324374501), (-76.1977570212, 0.5846579641))
            ThreePointArc((-76.1977570212, 0.5846579641), (-76.2, 0), (-76.1977570212, -0.5846579641))
            ThreePointArc((-76.1977570212, -0.5846579641), (-75.8897554045, -6.8691356552), (-75.0643215302, -13.1067781397))
        make_face()
        with BuildLine():
            ThreePointArc((-71.4025051926, 26.6105665521), (-68.9366006876, 32.4682165453), (-65.9911357684, 38.1))
            ThreePointArc((-65.9911357684, 38.1), (-62.5866006876, 43.4667391734), (-58.7466792395, 48.5311001146))
            ThreePointArc((-58.7466792395, 48.5311001146), (-76.9896583964, 44.45), (-71.4025051926, 26.6105665521))
        make_face()
        with BuildLine():
            ThreePointArc((-71.802434794, -25.5117690029), (-73.6743133021, -19.4559903234), (-75.0364186026, -13.2655901978))
            Line((-75.0364186026, -13.2655901978), (-75.0962151587, -13.1942390501))
            Line((-75.0962151587, -13.1942390501), (-75.0643215302, -13.1067781397))
            ThreePointArc((-75.0643215302, -13.1067781397), (-75.8897554045, -6.8691356552), (-76.1977570212, -0.5846579641))
            ThreePointArc((-76.1977570212, -0.5846579641), (-87.5494092428, -15.4373229946), (-71.802434794, -25.5117690029))
        make_face()
        with BuildLine():
            ThreePointArc((-58.7466792395, -48.5311001146), (-62.5866006876, -43.4667391734), (-65.9911357684, -38.1))
            ThreePointArc((-65.9911357684, -38.1), (-68.9366006876, -32.4682165453), (-71.4025051926, -26.6105665521))
            ThreePointArc((-71.4025051926, -26.6105665521), (-76.9896583964, -44.45), (-58.7466792395, -48.5311001146))
        make_face()
        with BuildLine():
            ThreePointArc((-76.1977570212, 0.5846579641), (-75.8839990446, 6.9324374501), (-75.0423507795, 13.2319911382))
            ThreePointArc((-75.0423507795, 13.2319911382), (-73.6786671882, 19.4394959134), (-71.802434794, 25.5117690029))
            ThreePointArc((-71.802434794, 25.5117690029), (-87.5494092428, 15.4373229946), (-76.1977570212, 0.5846579641))
        make_face()
        Polygon((16.6354453775, -20.1925026784), (25.8049429742, 4.310466961), (9.1694975967, 24.5029696394), (-16.6354453775, 20.1925026784), (-25.8049429742, -4.310466961), (-9.1694975967, -24.5029696394), align=None)
        Circle(F0_R, mode=Mode.SUBTRACT)
    extrude(amount=F1_DEPTH, both=True)


solid = f1.part
